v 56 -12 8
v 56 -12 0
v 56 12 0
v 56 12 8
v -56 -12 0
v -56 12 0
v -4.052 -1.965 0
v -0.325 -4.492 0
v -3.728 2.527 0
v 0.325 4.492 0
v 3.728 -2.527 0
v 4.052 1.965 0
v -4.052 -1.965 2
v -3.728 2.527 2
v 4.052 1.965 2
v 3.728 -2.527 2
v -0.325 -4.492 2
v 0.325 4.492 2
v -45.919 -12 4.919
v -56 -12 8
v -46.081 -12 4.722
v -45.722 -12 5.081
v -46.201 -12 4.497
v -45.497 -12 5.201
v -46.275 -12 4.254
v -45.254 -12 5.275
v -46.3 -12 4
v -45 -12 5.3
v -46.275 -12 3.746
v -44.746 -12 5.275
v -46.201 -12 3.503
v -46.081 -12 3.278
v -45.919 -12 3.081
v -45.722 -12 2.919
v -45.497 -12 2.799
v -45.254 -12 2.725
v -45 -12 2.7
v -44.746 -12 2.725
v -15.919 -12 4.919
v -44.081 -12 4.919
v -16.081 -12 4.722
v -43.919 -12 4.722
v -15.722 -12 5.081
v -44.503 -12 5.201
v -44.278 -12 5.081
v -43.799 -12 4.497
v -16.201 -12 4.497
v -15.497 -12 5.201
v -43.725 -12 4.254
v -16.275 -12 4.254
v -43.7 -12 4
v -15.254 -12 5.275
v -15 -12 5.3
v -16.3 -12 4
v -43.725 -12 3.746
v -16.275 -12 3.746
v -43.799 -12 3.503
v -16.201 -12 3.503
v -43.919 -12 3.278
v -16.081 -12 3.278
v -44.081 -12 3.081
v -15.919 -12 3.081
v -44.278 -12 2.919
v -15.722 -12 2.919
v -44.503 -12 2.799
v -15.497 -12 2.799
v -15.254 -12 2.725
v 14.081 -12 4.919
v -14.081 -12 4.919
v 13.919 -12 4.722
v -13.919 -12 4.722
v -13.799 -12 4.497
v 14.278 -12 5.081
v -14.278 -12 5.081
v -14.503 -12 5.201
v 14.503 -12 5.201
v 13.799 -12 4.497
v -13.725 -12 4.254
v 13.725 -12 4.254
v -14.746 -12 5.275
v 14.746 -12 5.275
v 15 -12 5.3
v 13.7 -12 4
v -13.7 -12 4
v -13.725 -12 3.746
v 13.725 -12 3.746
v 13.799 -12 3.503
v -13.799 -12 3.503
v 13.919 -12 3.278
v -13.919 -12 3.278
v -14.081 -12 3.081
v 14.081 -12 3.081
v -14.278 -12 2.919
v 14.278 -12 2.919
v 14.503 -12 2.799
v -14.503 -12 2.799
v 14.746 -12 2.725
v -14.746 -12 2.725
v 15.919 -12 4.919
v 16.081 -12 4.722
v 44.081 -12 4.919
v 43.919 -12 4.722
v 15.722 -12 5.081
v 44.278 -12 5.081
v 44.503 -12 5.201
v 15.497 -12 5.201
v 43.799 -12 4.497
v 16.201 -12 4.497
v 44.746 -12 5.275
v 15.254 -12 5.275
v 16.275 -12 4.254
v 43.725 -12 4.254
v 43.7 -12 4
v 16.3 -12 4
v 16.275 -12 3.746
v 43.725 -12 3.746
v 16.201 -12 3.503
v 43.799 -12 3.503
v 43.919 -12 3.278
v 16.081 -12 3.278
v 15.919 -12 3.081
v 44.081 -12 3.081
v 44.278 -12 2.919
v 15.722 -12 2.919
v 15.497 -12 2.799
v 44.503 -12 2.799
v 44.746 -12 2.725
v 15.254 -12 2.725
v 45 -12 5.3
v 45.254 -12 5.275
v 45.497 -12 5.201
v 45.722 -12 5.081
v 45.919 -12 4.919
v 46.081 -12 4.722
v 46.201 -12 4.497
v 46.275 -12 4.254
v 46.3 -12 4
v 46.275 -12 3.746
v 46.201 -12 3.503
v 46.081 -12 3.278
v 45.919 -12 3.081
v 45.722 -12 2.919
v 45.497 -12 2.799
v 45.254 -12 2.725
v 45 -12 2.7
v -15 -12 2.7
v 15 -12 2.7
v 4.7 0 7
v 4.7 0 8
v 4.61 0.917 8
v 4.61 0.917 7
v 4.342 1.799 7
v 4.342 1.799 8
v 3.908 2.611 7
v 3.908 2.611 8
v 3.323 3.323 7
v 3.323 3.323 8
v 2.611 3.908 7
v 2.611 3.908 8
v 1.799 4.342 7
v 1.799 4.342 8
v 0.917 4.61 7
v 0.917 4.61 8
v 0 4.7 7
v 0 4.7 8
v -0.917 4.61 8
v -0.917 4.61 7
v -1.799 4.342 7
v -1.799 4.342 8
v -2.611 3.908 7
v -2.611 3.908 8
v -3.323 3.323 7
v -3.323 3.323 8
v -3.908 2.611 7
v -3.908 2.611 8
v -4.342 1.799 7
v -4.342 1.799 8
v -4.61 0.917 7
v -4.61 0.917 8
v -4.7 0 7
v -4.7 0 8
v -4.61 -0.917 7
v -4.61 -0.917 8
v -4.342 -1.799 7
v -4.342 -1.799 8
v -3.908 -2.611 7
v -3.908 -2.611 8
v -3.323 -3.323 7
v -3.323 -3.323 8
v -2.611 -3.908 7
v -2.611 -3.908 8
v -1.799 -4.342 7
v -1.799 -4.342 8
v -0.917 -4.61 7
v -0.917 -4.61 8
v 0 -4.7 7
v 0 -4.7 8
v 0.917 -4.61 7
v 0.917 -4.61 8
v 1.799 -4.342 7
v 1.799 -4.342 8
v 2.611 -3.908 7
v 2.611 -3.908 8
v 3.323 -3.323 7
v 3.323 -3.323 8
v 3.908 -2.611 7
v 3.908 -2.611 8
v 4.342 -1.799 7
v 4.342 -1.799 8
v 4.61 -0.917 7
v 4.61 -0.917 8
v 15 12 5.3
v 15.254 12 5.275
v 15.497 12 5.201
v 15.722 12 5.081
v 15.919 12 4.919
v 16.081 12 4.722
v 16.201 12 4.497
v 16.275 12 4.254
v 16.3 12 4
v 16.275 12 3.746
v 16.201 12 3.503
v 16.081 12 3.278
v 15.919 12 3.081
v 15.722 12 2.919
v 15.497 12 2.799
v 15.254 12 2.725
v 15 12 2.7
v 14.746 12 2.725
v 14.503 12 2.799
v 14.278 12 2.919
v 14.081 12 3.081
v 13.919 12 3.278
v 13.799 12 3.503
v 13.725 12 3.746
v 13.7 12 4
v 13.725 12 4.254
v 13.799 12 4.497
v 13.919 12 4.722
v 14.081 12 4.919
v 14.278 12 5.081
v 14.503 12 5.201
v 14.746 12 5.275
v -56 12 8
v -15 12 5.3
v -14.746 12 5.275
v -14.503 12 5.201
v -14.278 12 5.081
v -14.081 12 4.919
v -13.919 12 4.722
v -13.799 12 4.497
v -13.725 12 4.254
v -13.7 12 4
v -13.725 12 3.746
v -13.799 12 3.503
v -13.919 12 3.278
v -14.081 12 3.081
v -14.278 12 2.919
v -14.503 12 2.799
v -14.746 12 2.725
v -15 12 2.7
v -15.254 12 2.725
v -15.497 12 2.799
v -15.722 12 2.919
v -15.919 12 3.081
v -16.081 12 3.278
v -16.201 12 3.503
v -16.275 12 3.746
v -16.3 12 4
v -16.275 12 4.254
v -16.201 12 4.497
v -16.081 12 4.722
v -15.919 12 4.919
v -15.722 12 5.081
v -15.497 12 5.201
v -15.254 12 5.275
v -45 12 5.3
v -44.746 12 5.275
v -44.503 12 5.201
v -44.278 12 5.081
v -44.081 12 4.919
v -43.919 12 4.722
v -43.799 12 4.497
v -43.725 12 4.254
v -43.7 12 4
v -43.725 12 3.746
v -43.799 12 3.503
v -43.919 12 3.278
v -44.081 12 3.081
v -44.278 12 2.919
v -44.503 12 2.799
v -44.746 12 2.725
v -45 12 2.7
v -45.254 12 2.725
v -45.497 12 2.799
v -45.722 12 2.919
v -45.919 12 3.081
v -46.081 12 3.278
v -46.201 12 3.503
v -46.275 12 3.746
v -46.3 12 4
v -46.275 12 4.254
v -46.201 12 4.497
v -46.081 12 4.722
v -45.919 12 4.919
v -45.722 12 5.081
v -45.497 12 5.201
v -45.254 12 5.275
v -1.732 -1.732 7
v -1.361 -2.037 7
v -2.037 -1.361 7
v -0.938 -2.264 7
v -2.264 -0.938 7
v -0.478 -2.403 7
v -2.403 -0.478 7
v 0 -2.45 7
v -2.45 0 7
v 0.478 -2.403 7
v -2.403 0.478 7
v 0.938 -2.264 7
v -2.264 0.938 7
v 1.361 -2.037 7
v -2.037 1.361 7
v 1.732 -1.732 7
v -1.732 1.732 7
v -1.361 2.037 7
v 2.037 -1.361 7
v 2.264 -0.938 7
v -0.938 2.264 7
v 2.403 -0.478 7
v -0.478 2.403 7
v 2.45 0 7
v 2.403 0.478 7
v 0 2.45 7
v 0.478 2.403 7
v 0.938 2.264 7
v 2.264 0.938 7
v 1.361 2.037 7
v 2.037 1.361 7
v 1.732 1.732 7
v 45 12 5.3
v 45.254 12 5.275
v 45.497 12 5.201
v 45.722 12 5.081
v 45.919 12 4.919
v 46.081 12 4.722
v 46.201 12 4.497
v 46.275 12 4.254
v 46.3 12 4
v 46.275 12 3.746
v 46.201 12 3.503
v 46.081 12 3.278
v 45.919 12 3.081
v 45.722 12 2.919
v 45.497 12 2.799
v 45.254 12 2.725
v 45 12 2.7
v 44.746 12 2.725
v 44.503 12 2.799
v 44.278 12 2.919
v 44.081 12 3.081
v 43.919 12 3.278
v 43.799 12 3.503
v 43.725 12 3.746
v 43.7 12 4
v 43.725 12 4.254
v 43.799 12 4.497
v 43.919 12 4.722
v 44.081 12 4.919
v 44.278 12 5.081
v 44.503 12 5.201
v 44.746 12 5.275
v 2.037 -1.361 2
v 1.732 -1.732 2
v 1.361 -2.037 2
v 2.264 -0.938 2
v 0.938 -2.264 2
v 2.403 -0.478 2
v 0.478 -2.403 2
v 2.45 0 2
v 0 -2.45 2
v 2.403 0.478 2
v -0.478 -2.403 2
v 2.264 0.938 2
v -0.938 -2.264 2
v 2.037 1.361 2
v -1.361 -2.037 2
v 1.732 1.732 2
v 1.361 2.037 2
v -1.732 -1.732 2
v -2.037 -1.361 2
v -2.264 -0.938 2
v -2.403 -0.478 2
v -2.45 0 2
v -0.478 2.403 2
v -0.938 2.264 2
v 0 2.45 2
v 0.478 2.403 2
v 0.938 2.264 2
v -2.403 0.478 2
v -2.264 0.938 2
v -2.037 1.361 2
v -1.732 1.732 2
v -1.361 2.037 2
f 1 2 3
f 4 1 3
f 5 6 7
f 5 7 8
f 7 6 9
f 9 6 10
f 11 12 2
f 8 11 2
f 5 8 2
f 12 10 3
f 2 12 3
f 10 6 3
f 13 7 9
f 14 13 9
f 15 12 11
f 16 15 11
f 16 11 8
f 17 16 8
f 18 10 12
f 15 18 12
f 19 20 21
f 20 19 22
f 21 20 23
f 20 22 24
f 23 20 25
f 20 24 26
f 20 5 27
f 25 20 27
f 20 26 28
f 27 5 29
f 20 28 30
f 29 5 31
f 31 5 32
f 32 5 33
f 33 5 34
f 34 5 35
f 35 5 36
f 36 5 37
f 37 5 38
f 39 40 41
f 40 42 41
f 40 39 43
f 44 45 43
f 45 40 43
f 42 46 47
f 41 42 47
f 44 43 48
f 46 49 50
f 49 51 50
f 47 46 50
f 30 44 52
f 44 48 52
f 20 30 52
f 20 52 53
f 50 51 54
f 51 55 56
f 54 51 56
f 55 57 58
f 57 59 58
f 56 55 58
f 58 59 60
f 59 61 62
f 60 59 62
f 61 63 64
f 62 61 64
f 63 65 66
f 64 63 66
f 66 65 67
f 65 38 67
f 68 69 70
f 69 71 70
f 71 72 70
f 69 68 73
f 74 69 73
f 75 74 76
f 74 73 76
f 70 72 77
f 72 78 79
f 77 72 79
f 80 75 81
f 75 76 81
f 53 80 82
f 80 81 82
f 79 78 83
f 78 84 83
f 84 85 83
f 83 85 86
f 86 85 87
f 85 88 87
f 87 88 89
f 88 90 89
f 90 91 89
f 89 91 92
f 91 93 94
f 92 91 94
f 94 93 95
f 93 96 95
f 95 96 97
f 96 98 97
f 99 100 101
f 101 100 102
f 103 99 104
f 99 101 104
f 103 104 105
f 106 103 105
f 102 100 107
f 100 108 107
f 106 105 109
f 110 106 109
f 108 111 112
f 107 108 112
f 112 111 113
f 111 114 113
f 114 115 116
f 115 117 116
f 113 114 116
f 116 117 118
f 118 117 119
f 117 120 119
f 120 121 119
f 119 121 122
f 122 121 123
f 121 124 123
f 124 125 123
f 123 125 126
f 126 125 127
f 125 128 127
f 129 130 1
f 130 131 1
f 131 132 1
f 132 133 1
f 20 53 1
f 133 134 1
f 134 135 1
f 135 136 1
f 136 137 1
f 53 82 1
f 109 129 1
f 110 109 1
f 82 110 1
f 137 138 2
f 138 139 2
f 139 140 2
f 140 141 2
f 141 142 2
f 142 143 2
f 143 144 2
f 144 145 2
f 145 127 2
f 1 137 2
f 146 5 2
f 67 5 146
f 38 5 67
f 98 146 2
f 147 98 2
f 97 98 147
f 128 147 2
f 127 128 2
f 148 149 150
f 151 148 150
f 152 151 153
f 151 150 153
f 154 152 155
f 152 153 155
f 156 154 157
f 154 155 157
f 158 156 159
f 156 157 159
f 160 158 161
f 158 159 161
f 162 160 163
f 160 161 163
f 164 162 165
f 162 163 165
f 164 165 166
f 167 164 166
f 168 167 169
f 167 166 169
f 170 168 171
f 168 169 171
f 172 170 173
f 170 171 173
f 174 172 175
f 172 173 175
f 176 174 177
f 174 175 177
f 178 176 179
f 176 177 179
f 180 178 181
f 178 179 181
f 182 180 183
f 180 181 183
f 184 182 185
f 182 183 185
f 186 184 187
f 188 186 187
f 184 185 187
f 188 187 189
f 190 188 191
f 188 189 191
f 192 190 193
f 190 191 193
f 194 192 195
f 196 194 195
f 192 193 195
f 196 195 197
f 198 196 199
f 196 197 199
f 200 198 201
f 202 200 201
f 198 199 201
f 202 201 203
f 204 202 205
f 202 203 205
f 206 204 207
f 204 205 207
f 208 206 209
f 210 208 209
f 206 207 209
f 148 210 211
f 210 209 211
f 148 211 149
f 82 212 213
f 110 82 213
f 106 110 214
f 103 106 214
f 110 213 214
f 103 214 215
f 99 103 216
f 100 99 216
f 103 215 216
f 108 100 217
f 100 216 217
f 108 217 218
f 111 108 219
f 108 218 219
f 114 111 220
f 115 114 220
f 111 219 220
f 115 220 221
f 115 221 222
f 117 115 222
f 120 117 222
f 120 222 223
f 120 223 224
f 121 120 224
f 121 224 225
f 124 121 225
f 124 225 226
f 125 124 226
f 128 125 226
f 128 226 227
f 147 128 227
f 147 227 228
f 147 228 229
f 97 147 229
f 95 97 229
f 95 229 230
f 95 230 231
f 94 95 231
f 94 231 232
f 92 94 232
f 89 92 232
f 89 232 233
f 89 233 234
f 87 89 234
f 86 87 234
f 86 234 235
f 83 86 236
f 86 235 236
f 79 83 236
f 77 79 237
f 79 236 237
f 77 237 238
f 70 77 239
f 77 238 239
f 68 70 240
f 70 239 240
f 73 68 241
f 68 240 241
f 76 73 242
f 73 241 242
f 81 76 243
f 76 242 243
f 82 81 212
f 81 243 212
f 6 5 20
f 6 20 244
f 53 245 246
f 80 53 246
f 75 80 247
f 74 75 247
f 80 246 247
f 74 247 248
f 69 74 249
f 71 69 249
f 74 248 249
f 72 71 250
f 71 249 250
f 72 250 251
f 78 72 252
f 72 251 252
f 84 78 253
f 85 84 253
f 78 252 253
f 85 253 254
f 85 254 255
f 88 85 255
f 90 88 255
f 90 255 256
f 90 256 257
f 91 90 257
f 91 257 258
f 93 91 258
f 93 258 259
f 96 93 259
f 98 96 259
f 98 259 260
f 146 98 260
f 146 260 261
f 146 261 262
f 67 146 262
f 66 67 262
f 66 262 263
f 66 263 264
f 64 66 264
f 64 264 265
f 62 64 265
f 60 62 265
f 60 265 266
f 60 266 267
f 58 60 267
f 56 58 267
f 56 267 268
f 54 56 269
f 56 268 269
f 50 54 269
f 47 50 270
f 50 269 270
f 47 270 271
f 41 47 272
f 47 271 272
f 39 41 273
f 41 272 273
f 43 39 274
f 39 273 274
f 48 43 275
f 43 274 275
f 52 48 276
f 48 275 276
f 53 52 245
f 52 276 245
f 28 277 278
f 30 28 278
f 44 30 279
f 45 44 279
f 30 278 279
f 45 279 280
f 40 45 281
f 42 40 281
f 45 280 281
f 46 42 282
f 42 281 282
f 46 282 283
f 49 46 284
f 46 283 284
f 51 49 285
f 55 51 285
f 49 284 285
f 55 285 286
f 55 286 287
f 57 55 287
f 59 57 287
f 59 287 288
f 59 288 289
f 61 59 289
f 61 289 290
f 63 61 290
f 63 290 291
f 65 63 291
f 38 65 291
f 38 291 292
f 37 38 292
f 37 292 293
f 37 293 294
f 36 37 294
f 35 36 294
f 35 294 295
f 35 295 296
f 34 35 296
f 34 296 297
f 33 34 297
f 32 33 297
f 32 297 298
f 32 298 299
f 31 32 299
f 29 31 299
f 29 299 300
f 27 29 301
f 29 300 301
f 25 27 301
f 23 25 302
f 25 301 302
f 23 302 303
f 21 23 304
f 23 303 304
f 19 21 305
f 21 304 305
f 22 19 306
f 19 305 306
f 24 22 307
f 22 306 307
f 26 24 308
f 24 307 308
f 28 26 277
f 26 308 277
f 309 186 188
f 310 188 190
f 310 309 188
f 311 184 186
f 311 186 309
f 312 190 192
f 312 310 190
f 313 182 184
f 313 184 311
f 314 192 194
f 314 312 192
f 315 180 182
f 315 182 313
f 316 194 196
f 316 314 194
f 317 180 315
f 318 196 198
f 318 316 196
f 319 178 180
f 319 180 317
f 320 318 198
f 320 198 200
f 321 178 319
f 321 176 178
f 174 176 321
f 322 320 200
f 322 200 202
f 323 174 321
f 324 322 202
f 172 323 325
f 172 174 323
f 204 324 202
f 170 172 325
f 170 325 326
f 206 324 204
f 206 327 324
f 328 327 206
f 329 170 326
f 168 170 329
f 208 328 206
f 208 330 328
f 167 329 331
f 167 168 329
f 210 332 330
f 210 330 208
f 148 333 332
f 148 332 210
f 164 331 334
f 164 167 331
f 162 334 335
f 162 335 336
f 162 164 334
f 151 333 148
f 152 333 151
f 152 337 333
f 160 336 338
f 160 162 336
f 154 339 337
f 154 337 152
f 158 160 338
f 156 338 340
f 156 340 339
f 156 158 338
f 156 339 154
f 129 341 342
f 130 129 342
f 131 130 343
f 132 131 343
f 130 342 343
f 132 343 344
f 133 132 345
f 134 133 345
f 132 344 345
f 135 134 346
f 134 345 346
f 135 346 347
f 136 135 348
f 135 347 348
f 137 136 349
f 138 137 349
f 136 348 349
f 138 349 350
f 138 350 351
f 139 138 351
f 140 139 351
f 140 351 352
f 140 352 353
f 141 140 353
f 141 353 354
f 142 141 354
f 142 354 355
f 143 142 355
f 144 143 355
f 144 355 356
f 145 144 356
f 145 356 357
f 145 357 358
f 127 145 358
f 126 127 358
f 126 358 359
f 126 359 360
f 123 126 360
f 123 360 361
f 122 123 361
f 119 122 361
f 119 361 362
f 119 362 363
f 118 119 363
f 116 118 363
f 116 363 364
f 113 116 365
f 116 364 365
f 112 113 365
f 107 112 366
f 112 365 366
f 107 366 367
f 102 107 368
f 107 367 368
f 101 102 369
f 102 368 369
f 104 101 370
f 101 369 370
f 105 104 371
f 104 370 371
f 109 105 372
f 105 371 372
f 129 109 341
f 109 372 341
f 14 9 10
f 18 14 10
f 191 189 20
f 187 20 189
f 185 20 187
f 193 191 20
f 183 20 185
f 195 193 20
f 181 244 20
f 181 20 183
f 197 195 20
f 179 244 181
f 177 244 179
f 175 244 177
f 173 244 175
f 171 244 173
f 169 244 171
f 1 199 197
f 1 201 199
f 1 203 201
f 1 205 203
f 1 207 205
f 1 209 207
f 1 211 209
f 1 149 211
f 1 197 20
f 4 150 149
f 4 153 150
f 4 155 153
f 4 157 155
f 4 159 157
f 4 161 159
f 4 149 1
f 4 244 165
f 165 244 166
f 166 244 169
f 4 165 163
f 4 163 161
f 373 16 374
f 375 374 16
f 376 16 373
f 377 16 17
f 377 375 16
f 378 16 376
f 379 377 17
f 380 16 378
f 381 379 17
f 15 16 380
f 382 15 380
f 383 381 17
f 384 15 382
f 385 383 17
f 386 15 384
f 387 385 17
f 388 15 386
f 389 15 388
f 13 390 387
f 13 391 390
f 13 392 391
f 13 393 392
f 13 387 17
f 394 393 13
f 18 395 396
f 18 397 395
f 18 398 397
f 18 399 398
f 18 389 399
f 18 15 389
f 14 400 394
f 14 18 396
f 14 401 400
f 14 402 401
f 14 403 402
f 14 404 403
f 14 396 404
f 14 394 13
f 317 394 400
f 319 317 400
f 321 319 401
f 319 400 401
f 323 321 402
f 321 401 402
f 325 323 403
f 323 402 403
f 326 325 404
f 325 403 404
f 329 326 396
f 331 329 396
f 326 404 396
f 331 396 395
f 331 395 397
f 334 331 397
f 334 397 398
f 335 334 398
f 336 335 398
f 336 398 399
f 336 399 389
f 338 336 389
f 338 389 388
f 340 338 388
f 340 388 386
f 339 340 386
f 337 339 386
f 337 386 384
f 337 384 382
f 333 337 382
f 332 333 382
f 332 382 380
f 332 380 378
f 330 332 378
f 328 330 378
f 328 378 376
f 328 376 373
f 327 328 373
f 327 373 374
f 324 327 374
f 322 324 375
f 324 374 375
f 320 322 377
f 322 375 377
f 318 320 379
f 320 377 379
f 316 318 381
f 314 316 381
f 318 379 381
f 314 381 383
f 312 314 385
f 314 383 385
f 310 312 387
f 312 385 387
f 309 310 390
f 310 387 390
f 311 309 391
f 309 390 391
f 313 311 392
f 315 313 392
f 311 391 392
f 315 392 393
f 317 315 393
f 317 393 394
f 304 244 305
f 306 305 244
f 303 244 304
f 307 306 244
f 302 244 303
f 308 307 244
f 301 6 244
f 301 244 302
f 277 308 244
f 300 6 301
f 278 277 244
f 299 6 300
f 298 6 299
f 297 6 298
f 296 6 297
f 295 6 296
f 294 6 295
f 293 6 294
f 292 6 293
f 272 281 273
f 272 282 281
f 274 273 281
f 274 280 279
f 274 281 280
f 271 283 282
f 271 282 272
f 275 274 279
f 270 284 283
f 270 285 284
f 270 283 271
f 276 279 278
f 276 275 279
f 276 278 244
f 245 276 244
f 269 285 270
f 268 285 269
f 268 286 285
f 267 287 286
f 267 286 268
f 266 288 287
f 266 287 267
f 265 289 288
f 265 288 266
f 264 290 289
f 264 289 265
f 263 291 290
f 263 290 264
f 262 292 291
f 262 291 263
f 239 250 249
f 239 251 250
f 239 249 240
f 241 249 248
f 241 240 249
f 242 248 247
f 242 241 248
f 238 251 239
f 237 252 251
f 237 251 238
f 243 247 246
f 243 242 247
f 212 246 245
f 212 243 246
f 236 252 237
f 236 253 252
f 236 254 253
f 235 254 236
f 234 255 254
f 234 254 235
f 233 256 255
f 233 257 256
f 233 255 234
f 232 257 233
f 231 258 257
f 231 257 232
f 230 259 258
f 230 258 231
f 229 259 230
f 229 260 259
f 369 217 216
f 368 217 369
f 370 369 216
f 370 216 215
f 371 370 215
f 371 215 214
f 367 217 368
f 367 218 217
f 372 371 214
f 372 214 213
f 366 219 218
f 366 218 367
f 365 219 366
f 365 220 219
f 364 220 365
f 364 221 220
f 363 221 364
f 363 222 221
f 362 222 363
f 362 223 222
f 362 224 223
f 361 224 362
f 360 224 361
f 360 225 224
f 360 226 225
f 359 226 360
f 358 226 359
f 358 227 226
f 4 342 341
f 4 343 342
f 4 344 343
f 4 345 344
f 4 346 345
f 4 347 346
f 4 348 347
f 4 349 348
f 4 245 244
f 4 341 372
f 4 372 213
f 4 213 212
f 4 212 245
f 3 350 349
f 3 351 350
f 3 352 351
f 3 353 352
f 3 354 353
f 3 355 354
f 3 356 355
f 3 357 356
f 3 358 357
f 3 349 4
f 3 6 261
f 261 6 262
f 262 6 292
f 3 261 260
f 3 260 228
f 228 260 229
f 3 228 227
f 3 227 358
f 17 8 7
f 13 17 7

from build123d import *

# Parameters (mm, degrees)
SKETCH_1_W          = 112
SKETCH_1_H          = 24
EXTRUDE_1_DEPTH     = 8
SKETCH_2_R          = 1.3
CUT_EXTRUDE_1_DEPTH = 30
SKETCH_3_R          = 2.45
CUT_EXTRUDE_2_DEPTH = 30
CUT_EXTRUDE_3_DEPTH = 2
SKETCH_5_R          = 4.7
CUT_EXTRUDE_4_DEPTH = 1


with BuildPart() as part:
    # 草图1 → 凸台-拉伸1 (new body)
    with BuildSketch(Plane.XY):
        Rectangle(SKETCH_1_W, SKETCH_1_H)
    extrude(amount=EXTRUDE_1_DEPTH)

    # 草图2 → 切除-拉伸1 (cut)
    with BuildSketch(Plane(origin=(0, 12, 0), x_dir=(1, 0, 0), z_dir=(0, 1, 0))):
        with Locations(Location((-15, -4, 0), (0, 0, 270))):
            Circle(SKETCH_2_R)
        with Locations(Location((-45, -4, 0), (0, 0, 270))):
            Circle(SKETCH_2_R)
        with Locations(Location((45, -4, 0), (0, 0, 270))):
            Circle(SKETCH_2_R)
        with Locations(Location((15, -4, 0), (0, 0, 270))):
            Circle(SKETCH_2_R)
    extrude(amount=-CUT_EXTRUDE_1_DEPTH, mode=Mode.SUBTRACT)

    # 草图3 → 切除-拉伸2 (cut)
    with BuildSketch(Plane(origin=(0, 0, 0), x_dir=(-1, 0, 0), z_dir=(0, 0, -1))):
        Circle(SKETCH_3_R)
    extrude(amount=-CUT_EXTRUDE_2_DEPTH, mode=Mode.SUBTRACT)

    # 草图4 → 切除-拉伸3 (cut)
    with BuildSketch(Plane(origin=(0, 0, 0), x_dir=(-1, 0, 0), z_dir=(0, 0, -1))):
        Polygon((4.052179536, -1.964647808), (3.727524679, 2.526966514), (-0.324654856, 4.491614323), (-4.052179536, 1.964647808), (-3.727524679, -2.526966514), (0.324654856, -4.491614323), align=None)
    extrude(amount=-CUT_EXTRUDE_3_DEPTH, mode=Mode.SUBTRACT)

    # 草图5 → 切除-拉伸4 (cut)
    with BuildSketch(Plane.XY.offset(8)):
        Circle(SKETCH_5_R)
    extrude(amount=-CUT_EXTRUDE_4_DEPTH, mode=Mode.SUBTRACT)


solid = part.part
